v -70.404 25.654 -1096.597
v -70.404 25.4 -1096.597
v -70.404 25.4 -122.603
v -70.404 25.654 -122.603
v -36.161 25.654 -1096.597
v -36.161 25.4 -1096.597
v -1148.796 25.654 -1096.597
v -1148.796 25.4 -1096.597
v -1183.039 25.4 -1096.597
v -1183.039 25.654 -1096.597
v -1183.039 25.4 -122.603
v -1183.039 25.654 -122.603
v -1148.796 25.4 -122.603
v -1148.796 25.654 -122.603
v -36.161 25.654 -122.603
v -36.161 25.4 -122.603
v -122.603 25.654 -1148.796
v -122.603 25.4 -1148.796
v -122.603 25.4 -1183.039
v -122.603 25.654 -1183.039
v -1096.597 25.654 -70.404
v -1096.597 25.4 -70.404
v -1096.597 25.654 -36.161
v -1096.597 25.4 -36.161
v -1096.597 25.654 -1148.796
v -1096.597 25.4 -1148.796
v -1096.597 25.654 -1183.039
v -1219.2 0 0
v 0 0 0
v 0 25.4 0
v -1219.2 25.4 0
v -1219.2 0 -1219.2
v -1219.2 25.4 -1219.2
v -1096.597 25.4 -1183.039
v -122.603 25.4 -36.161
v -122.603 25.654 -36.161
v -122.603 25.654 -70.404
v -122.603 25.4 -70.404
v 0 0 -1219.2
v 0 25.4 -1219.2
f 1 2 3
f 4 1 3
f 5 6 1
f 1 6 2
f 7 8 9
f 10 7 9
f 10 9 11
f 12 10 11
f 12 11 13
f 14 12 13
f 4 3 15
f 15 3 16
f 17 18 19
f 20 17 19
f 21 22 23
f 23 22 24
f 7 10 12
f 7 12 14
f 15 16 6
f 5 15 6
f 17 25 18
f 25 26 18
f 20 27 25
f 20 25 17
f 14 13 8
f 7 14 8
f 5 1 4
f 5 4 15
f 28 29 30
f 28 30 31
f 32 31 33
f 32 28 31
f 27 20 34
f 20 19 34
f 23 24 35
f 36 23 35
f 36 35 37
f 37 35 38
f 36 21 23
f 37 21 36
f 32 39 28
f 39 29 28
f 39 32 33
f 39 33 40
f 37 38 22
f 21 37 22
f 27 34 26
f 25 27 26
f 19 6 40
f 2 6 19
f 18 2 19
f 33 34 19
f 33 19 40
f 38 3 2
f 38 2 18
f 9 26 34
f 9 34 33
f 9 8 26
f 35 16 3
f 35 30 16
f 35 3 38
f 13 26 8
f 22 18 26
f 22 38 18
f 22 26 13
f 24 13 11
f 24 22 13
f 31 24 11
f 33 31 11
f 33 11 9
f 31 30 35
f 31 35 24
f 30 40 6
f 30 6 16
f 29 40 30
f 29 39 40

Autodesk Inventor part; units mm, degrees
ref_plane "YZ Plane" through (0, 0, 0) normal (1, 0, 0) x (0, 1, 0)
ref_plane "XZ Plane" through (0, 0, 0) normal (0, 1, 0) x (-1, 0, 0)
ref_plane "XY Plane" through (0, 0, 0) normal (0, 0, 1) x (1, 0, 0)
sketch "Sketch1" plane through (0, 0, 0) normal (0, 1, 0) x (-1, 0, 0)
  line L0 (0, 0) -> (1219.2, 0)
  line L1 (1219.2, 0) -> (1219.2, -1219.2)
  line L2 (1219.2, -1219.2) -> (0, -1219.2)
  line L3 (0, -1219.2) -> (0, 0)
  dimension "d0" = 1219.2
  dimension "d1" = 1219.2
extrude "Extrusion1" add sketch "Sketch1" along normal blind 25.4
sketch "Sketch2" plane through (0, 25.4, 0) normal (0, 1, 0) x (1, 0, 0)
  line L0 (-1219.2, 1219.2) -> (-1219.2, 0) projected
  line L1 (0, 1219.2) -> (-1219.2, 1219.2) projected
  line L2 (-1183.0394, 122.6032) -> (-1148.7962, 122.6032)
  line L3 (-1148.7962, 122.6032) -> (-1148.7962, 1096.5968)
  line L4 (-1148.7962, 1096.5968) -> (-1183.0394, 1096.5968)
  line L5 (-1183.0394, 1096.5968) -> (-1183.0394, 122.6032)
  line L6 (-122.6032, 36.1606) -> (-122.6032, 70.4038)
  line L7 (-122.6032, 70.4038) -> (-1096.5968, 70.4038)
  line L8 (-1096.5968, 70.4038) -> (-1096.5968, 36.1606)
  line L9 (-1096.5968, 36.1606) -> (-122.6032, 36.1606)
  line L10 (-36.1606, 1096.5968) -> (-70.4038, 1096.5968)
  line L11 (-70.4038, 1096.5968) -> (-70.4038, 122.6032)
  line L12 (-70.4038, 122.6032) -> (-36.1606, 122.6032)
  line L13 (-36.1606, 122.6032) -> (-36.1606, 1096.5968)
  line L14 (-1096.5968, 1183.0394) -> (-1096.5968, 1148.7962)
  line L15 (-1096.5968, 1148.7962) -> (-122.6032, 1148.7962)
  line L16 (-122.6032, 1148.7962) -> (-122.6032, 1183.0394)
  line L17 (-122.6032, 1183.0394) -> (-1096.5968, 1183.0394)
  point P0 (0, 0)
  point P1 (-609.6, 609.6)
  dimension "d4" = 609.6
  dimension "d5" = 609.6
  dimension "d8" = 360
extrude "Extrusion2" add sketch "Sketch2" along normal blind 0.254
equation "\"d1\" = d0"
equation "\"d5\" = d4"
properties part number "intersection_1"
